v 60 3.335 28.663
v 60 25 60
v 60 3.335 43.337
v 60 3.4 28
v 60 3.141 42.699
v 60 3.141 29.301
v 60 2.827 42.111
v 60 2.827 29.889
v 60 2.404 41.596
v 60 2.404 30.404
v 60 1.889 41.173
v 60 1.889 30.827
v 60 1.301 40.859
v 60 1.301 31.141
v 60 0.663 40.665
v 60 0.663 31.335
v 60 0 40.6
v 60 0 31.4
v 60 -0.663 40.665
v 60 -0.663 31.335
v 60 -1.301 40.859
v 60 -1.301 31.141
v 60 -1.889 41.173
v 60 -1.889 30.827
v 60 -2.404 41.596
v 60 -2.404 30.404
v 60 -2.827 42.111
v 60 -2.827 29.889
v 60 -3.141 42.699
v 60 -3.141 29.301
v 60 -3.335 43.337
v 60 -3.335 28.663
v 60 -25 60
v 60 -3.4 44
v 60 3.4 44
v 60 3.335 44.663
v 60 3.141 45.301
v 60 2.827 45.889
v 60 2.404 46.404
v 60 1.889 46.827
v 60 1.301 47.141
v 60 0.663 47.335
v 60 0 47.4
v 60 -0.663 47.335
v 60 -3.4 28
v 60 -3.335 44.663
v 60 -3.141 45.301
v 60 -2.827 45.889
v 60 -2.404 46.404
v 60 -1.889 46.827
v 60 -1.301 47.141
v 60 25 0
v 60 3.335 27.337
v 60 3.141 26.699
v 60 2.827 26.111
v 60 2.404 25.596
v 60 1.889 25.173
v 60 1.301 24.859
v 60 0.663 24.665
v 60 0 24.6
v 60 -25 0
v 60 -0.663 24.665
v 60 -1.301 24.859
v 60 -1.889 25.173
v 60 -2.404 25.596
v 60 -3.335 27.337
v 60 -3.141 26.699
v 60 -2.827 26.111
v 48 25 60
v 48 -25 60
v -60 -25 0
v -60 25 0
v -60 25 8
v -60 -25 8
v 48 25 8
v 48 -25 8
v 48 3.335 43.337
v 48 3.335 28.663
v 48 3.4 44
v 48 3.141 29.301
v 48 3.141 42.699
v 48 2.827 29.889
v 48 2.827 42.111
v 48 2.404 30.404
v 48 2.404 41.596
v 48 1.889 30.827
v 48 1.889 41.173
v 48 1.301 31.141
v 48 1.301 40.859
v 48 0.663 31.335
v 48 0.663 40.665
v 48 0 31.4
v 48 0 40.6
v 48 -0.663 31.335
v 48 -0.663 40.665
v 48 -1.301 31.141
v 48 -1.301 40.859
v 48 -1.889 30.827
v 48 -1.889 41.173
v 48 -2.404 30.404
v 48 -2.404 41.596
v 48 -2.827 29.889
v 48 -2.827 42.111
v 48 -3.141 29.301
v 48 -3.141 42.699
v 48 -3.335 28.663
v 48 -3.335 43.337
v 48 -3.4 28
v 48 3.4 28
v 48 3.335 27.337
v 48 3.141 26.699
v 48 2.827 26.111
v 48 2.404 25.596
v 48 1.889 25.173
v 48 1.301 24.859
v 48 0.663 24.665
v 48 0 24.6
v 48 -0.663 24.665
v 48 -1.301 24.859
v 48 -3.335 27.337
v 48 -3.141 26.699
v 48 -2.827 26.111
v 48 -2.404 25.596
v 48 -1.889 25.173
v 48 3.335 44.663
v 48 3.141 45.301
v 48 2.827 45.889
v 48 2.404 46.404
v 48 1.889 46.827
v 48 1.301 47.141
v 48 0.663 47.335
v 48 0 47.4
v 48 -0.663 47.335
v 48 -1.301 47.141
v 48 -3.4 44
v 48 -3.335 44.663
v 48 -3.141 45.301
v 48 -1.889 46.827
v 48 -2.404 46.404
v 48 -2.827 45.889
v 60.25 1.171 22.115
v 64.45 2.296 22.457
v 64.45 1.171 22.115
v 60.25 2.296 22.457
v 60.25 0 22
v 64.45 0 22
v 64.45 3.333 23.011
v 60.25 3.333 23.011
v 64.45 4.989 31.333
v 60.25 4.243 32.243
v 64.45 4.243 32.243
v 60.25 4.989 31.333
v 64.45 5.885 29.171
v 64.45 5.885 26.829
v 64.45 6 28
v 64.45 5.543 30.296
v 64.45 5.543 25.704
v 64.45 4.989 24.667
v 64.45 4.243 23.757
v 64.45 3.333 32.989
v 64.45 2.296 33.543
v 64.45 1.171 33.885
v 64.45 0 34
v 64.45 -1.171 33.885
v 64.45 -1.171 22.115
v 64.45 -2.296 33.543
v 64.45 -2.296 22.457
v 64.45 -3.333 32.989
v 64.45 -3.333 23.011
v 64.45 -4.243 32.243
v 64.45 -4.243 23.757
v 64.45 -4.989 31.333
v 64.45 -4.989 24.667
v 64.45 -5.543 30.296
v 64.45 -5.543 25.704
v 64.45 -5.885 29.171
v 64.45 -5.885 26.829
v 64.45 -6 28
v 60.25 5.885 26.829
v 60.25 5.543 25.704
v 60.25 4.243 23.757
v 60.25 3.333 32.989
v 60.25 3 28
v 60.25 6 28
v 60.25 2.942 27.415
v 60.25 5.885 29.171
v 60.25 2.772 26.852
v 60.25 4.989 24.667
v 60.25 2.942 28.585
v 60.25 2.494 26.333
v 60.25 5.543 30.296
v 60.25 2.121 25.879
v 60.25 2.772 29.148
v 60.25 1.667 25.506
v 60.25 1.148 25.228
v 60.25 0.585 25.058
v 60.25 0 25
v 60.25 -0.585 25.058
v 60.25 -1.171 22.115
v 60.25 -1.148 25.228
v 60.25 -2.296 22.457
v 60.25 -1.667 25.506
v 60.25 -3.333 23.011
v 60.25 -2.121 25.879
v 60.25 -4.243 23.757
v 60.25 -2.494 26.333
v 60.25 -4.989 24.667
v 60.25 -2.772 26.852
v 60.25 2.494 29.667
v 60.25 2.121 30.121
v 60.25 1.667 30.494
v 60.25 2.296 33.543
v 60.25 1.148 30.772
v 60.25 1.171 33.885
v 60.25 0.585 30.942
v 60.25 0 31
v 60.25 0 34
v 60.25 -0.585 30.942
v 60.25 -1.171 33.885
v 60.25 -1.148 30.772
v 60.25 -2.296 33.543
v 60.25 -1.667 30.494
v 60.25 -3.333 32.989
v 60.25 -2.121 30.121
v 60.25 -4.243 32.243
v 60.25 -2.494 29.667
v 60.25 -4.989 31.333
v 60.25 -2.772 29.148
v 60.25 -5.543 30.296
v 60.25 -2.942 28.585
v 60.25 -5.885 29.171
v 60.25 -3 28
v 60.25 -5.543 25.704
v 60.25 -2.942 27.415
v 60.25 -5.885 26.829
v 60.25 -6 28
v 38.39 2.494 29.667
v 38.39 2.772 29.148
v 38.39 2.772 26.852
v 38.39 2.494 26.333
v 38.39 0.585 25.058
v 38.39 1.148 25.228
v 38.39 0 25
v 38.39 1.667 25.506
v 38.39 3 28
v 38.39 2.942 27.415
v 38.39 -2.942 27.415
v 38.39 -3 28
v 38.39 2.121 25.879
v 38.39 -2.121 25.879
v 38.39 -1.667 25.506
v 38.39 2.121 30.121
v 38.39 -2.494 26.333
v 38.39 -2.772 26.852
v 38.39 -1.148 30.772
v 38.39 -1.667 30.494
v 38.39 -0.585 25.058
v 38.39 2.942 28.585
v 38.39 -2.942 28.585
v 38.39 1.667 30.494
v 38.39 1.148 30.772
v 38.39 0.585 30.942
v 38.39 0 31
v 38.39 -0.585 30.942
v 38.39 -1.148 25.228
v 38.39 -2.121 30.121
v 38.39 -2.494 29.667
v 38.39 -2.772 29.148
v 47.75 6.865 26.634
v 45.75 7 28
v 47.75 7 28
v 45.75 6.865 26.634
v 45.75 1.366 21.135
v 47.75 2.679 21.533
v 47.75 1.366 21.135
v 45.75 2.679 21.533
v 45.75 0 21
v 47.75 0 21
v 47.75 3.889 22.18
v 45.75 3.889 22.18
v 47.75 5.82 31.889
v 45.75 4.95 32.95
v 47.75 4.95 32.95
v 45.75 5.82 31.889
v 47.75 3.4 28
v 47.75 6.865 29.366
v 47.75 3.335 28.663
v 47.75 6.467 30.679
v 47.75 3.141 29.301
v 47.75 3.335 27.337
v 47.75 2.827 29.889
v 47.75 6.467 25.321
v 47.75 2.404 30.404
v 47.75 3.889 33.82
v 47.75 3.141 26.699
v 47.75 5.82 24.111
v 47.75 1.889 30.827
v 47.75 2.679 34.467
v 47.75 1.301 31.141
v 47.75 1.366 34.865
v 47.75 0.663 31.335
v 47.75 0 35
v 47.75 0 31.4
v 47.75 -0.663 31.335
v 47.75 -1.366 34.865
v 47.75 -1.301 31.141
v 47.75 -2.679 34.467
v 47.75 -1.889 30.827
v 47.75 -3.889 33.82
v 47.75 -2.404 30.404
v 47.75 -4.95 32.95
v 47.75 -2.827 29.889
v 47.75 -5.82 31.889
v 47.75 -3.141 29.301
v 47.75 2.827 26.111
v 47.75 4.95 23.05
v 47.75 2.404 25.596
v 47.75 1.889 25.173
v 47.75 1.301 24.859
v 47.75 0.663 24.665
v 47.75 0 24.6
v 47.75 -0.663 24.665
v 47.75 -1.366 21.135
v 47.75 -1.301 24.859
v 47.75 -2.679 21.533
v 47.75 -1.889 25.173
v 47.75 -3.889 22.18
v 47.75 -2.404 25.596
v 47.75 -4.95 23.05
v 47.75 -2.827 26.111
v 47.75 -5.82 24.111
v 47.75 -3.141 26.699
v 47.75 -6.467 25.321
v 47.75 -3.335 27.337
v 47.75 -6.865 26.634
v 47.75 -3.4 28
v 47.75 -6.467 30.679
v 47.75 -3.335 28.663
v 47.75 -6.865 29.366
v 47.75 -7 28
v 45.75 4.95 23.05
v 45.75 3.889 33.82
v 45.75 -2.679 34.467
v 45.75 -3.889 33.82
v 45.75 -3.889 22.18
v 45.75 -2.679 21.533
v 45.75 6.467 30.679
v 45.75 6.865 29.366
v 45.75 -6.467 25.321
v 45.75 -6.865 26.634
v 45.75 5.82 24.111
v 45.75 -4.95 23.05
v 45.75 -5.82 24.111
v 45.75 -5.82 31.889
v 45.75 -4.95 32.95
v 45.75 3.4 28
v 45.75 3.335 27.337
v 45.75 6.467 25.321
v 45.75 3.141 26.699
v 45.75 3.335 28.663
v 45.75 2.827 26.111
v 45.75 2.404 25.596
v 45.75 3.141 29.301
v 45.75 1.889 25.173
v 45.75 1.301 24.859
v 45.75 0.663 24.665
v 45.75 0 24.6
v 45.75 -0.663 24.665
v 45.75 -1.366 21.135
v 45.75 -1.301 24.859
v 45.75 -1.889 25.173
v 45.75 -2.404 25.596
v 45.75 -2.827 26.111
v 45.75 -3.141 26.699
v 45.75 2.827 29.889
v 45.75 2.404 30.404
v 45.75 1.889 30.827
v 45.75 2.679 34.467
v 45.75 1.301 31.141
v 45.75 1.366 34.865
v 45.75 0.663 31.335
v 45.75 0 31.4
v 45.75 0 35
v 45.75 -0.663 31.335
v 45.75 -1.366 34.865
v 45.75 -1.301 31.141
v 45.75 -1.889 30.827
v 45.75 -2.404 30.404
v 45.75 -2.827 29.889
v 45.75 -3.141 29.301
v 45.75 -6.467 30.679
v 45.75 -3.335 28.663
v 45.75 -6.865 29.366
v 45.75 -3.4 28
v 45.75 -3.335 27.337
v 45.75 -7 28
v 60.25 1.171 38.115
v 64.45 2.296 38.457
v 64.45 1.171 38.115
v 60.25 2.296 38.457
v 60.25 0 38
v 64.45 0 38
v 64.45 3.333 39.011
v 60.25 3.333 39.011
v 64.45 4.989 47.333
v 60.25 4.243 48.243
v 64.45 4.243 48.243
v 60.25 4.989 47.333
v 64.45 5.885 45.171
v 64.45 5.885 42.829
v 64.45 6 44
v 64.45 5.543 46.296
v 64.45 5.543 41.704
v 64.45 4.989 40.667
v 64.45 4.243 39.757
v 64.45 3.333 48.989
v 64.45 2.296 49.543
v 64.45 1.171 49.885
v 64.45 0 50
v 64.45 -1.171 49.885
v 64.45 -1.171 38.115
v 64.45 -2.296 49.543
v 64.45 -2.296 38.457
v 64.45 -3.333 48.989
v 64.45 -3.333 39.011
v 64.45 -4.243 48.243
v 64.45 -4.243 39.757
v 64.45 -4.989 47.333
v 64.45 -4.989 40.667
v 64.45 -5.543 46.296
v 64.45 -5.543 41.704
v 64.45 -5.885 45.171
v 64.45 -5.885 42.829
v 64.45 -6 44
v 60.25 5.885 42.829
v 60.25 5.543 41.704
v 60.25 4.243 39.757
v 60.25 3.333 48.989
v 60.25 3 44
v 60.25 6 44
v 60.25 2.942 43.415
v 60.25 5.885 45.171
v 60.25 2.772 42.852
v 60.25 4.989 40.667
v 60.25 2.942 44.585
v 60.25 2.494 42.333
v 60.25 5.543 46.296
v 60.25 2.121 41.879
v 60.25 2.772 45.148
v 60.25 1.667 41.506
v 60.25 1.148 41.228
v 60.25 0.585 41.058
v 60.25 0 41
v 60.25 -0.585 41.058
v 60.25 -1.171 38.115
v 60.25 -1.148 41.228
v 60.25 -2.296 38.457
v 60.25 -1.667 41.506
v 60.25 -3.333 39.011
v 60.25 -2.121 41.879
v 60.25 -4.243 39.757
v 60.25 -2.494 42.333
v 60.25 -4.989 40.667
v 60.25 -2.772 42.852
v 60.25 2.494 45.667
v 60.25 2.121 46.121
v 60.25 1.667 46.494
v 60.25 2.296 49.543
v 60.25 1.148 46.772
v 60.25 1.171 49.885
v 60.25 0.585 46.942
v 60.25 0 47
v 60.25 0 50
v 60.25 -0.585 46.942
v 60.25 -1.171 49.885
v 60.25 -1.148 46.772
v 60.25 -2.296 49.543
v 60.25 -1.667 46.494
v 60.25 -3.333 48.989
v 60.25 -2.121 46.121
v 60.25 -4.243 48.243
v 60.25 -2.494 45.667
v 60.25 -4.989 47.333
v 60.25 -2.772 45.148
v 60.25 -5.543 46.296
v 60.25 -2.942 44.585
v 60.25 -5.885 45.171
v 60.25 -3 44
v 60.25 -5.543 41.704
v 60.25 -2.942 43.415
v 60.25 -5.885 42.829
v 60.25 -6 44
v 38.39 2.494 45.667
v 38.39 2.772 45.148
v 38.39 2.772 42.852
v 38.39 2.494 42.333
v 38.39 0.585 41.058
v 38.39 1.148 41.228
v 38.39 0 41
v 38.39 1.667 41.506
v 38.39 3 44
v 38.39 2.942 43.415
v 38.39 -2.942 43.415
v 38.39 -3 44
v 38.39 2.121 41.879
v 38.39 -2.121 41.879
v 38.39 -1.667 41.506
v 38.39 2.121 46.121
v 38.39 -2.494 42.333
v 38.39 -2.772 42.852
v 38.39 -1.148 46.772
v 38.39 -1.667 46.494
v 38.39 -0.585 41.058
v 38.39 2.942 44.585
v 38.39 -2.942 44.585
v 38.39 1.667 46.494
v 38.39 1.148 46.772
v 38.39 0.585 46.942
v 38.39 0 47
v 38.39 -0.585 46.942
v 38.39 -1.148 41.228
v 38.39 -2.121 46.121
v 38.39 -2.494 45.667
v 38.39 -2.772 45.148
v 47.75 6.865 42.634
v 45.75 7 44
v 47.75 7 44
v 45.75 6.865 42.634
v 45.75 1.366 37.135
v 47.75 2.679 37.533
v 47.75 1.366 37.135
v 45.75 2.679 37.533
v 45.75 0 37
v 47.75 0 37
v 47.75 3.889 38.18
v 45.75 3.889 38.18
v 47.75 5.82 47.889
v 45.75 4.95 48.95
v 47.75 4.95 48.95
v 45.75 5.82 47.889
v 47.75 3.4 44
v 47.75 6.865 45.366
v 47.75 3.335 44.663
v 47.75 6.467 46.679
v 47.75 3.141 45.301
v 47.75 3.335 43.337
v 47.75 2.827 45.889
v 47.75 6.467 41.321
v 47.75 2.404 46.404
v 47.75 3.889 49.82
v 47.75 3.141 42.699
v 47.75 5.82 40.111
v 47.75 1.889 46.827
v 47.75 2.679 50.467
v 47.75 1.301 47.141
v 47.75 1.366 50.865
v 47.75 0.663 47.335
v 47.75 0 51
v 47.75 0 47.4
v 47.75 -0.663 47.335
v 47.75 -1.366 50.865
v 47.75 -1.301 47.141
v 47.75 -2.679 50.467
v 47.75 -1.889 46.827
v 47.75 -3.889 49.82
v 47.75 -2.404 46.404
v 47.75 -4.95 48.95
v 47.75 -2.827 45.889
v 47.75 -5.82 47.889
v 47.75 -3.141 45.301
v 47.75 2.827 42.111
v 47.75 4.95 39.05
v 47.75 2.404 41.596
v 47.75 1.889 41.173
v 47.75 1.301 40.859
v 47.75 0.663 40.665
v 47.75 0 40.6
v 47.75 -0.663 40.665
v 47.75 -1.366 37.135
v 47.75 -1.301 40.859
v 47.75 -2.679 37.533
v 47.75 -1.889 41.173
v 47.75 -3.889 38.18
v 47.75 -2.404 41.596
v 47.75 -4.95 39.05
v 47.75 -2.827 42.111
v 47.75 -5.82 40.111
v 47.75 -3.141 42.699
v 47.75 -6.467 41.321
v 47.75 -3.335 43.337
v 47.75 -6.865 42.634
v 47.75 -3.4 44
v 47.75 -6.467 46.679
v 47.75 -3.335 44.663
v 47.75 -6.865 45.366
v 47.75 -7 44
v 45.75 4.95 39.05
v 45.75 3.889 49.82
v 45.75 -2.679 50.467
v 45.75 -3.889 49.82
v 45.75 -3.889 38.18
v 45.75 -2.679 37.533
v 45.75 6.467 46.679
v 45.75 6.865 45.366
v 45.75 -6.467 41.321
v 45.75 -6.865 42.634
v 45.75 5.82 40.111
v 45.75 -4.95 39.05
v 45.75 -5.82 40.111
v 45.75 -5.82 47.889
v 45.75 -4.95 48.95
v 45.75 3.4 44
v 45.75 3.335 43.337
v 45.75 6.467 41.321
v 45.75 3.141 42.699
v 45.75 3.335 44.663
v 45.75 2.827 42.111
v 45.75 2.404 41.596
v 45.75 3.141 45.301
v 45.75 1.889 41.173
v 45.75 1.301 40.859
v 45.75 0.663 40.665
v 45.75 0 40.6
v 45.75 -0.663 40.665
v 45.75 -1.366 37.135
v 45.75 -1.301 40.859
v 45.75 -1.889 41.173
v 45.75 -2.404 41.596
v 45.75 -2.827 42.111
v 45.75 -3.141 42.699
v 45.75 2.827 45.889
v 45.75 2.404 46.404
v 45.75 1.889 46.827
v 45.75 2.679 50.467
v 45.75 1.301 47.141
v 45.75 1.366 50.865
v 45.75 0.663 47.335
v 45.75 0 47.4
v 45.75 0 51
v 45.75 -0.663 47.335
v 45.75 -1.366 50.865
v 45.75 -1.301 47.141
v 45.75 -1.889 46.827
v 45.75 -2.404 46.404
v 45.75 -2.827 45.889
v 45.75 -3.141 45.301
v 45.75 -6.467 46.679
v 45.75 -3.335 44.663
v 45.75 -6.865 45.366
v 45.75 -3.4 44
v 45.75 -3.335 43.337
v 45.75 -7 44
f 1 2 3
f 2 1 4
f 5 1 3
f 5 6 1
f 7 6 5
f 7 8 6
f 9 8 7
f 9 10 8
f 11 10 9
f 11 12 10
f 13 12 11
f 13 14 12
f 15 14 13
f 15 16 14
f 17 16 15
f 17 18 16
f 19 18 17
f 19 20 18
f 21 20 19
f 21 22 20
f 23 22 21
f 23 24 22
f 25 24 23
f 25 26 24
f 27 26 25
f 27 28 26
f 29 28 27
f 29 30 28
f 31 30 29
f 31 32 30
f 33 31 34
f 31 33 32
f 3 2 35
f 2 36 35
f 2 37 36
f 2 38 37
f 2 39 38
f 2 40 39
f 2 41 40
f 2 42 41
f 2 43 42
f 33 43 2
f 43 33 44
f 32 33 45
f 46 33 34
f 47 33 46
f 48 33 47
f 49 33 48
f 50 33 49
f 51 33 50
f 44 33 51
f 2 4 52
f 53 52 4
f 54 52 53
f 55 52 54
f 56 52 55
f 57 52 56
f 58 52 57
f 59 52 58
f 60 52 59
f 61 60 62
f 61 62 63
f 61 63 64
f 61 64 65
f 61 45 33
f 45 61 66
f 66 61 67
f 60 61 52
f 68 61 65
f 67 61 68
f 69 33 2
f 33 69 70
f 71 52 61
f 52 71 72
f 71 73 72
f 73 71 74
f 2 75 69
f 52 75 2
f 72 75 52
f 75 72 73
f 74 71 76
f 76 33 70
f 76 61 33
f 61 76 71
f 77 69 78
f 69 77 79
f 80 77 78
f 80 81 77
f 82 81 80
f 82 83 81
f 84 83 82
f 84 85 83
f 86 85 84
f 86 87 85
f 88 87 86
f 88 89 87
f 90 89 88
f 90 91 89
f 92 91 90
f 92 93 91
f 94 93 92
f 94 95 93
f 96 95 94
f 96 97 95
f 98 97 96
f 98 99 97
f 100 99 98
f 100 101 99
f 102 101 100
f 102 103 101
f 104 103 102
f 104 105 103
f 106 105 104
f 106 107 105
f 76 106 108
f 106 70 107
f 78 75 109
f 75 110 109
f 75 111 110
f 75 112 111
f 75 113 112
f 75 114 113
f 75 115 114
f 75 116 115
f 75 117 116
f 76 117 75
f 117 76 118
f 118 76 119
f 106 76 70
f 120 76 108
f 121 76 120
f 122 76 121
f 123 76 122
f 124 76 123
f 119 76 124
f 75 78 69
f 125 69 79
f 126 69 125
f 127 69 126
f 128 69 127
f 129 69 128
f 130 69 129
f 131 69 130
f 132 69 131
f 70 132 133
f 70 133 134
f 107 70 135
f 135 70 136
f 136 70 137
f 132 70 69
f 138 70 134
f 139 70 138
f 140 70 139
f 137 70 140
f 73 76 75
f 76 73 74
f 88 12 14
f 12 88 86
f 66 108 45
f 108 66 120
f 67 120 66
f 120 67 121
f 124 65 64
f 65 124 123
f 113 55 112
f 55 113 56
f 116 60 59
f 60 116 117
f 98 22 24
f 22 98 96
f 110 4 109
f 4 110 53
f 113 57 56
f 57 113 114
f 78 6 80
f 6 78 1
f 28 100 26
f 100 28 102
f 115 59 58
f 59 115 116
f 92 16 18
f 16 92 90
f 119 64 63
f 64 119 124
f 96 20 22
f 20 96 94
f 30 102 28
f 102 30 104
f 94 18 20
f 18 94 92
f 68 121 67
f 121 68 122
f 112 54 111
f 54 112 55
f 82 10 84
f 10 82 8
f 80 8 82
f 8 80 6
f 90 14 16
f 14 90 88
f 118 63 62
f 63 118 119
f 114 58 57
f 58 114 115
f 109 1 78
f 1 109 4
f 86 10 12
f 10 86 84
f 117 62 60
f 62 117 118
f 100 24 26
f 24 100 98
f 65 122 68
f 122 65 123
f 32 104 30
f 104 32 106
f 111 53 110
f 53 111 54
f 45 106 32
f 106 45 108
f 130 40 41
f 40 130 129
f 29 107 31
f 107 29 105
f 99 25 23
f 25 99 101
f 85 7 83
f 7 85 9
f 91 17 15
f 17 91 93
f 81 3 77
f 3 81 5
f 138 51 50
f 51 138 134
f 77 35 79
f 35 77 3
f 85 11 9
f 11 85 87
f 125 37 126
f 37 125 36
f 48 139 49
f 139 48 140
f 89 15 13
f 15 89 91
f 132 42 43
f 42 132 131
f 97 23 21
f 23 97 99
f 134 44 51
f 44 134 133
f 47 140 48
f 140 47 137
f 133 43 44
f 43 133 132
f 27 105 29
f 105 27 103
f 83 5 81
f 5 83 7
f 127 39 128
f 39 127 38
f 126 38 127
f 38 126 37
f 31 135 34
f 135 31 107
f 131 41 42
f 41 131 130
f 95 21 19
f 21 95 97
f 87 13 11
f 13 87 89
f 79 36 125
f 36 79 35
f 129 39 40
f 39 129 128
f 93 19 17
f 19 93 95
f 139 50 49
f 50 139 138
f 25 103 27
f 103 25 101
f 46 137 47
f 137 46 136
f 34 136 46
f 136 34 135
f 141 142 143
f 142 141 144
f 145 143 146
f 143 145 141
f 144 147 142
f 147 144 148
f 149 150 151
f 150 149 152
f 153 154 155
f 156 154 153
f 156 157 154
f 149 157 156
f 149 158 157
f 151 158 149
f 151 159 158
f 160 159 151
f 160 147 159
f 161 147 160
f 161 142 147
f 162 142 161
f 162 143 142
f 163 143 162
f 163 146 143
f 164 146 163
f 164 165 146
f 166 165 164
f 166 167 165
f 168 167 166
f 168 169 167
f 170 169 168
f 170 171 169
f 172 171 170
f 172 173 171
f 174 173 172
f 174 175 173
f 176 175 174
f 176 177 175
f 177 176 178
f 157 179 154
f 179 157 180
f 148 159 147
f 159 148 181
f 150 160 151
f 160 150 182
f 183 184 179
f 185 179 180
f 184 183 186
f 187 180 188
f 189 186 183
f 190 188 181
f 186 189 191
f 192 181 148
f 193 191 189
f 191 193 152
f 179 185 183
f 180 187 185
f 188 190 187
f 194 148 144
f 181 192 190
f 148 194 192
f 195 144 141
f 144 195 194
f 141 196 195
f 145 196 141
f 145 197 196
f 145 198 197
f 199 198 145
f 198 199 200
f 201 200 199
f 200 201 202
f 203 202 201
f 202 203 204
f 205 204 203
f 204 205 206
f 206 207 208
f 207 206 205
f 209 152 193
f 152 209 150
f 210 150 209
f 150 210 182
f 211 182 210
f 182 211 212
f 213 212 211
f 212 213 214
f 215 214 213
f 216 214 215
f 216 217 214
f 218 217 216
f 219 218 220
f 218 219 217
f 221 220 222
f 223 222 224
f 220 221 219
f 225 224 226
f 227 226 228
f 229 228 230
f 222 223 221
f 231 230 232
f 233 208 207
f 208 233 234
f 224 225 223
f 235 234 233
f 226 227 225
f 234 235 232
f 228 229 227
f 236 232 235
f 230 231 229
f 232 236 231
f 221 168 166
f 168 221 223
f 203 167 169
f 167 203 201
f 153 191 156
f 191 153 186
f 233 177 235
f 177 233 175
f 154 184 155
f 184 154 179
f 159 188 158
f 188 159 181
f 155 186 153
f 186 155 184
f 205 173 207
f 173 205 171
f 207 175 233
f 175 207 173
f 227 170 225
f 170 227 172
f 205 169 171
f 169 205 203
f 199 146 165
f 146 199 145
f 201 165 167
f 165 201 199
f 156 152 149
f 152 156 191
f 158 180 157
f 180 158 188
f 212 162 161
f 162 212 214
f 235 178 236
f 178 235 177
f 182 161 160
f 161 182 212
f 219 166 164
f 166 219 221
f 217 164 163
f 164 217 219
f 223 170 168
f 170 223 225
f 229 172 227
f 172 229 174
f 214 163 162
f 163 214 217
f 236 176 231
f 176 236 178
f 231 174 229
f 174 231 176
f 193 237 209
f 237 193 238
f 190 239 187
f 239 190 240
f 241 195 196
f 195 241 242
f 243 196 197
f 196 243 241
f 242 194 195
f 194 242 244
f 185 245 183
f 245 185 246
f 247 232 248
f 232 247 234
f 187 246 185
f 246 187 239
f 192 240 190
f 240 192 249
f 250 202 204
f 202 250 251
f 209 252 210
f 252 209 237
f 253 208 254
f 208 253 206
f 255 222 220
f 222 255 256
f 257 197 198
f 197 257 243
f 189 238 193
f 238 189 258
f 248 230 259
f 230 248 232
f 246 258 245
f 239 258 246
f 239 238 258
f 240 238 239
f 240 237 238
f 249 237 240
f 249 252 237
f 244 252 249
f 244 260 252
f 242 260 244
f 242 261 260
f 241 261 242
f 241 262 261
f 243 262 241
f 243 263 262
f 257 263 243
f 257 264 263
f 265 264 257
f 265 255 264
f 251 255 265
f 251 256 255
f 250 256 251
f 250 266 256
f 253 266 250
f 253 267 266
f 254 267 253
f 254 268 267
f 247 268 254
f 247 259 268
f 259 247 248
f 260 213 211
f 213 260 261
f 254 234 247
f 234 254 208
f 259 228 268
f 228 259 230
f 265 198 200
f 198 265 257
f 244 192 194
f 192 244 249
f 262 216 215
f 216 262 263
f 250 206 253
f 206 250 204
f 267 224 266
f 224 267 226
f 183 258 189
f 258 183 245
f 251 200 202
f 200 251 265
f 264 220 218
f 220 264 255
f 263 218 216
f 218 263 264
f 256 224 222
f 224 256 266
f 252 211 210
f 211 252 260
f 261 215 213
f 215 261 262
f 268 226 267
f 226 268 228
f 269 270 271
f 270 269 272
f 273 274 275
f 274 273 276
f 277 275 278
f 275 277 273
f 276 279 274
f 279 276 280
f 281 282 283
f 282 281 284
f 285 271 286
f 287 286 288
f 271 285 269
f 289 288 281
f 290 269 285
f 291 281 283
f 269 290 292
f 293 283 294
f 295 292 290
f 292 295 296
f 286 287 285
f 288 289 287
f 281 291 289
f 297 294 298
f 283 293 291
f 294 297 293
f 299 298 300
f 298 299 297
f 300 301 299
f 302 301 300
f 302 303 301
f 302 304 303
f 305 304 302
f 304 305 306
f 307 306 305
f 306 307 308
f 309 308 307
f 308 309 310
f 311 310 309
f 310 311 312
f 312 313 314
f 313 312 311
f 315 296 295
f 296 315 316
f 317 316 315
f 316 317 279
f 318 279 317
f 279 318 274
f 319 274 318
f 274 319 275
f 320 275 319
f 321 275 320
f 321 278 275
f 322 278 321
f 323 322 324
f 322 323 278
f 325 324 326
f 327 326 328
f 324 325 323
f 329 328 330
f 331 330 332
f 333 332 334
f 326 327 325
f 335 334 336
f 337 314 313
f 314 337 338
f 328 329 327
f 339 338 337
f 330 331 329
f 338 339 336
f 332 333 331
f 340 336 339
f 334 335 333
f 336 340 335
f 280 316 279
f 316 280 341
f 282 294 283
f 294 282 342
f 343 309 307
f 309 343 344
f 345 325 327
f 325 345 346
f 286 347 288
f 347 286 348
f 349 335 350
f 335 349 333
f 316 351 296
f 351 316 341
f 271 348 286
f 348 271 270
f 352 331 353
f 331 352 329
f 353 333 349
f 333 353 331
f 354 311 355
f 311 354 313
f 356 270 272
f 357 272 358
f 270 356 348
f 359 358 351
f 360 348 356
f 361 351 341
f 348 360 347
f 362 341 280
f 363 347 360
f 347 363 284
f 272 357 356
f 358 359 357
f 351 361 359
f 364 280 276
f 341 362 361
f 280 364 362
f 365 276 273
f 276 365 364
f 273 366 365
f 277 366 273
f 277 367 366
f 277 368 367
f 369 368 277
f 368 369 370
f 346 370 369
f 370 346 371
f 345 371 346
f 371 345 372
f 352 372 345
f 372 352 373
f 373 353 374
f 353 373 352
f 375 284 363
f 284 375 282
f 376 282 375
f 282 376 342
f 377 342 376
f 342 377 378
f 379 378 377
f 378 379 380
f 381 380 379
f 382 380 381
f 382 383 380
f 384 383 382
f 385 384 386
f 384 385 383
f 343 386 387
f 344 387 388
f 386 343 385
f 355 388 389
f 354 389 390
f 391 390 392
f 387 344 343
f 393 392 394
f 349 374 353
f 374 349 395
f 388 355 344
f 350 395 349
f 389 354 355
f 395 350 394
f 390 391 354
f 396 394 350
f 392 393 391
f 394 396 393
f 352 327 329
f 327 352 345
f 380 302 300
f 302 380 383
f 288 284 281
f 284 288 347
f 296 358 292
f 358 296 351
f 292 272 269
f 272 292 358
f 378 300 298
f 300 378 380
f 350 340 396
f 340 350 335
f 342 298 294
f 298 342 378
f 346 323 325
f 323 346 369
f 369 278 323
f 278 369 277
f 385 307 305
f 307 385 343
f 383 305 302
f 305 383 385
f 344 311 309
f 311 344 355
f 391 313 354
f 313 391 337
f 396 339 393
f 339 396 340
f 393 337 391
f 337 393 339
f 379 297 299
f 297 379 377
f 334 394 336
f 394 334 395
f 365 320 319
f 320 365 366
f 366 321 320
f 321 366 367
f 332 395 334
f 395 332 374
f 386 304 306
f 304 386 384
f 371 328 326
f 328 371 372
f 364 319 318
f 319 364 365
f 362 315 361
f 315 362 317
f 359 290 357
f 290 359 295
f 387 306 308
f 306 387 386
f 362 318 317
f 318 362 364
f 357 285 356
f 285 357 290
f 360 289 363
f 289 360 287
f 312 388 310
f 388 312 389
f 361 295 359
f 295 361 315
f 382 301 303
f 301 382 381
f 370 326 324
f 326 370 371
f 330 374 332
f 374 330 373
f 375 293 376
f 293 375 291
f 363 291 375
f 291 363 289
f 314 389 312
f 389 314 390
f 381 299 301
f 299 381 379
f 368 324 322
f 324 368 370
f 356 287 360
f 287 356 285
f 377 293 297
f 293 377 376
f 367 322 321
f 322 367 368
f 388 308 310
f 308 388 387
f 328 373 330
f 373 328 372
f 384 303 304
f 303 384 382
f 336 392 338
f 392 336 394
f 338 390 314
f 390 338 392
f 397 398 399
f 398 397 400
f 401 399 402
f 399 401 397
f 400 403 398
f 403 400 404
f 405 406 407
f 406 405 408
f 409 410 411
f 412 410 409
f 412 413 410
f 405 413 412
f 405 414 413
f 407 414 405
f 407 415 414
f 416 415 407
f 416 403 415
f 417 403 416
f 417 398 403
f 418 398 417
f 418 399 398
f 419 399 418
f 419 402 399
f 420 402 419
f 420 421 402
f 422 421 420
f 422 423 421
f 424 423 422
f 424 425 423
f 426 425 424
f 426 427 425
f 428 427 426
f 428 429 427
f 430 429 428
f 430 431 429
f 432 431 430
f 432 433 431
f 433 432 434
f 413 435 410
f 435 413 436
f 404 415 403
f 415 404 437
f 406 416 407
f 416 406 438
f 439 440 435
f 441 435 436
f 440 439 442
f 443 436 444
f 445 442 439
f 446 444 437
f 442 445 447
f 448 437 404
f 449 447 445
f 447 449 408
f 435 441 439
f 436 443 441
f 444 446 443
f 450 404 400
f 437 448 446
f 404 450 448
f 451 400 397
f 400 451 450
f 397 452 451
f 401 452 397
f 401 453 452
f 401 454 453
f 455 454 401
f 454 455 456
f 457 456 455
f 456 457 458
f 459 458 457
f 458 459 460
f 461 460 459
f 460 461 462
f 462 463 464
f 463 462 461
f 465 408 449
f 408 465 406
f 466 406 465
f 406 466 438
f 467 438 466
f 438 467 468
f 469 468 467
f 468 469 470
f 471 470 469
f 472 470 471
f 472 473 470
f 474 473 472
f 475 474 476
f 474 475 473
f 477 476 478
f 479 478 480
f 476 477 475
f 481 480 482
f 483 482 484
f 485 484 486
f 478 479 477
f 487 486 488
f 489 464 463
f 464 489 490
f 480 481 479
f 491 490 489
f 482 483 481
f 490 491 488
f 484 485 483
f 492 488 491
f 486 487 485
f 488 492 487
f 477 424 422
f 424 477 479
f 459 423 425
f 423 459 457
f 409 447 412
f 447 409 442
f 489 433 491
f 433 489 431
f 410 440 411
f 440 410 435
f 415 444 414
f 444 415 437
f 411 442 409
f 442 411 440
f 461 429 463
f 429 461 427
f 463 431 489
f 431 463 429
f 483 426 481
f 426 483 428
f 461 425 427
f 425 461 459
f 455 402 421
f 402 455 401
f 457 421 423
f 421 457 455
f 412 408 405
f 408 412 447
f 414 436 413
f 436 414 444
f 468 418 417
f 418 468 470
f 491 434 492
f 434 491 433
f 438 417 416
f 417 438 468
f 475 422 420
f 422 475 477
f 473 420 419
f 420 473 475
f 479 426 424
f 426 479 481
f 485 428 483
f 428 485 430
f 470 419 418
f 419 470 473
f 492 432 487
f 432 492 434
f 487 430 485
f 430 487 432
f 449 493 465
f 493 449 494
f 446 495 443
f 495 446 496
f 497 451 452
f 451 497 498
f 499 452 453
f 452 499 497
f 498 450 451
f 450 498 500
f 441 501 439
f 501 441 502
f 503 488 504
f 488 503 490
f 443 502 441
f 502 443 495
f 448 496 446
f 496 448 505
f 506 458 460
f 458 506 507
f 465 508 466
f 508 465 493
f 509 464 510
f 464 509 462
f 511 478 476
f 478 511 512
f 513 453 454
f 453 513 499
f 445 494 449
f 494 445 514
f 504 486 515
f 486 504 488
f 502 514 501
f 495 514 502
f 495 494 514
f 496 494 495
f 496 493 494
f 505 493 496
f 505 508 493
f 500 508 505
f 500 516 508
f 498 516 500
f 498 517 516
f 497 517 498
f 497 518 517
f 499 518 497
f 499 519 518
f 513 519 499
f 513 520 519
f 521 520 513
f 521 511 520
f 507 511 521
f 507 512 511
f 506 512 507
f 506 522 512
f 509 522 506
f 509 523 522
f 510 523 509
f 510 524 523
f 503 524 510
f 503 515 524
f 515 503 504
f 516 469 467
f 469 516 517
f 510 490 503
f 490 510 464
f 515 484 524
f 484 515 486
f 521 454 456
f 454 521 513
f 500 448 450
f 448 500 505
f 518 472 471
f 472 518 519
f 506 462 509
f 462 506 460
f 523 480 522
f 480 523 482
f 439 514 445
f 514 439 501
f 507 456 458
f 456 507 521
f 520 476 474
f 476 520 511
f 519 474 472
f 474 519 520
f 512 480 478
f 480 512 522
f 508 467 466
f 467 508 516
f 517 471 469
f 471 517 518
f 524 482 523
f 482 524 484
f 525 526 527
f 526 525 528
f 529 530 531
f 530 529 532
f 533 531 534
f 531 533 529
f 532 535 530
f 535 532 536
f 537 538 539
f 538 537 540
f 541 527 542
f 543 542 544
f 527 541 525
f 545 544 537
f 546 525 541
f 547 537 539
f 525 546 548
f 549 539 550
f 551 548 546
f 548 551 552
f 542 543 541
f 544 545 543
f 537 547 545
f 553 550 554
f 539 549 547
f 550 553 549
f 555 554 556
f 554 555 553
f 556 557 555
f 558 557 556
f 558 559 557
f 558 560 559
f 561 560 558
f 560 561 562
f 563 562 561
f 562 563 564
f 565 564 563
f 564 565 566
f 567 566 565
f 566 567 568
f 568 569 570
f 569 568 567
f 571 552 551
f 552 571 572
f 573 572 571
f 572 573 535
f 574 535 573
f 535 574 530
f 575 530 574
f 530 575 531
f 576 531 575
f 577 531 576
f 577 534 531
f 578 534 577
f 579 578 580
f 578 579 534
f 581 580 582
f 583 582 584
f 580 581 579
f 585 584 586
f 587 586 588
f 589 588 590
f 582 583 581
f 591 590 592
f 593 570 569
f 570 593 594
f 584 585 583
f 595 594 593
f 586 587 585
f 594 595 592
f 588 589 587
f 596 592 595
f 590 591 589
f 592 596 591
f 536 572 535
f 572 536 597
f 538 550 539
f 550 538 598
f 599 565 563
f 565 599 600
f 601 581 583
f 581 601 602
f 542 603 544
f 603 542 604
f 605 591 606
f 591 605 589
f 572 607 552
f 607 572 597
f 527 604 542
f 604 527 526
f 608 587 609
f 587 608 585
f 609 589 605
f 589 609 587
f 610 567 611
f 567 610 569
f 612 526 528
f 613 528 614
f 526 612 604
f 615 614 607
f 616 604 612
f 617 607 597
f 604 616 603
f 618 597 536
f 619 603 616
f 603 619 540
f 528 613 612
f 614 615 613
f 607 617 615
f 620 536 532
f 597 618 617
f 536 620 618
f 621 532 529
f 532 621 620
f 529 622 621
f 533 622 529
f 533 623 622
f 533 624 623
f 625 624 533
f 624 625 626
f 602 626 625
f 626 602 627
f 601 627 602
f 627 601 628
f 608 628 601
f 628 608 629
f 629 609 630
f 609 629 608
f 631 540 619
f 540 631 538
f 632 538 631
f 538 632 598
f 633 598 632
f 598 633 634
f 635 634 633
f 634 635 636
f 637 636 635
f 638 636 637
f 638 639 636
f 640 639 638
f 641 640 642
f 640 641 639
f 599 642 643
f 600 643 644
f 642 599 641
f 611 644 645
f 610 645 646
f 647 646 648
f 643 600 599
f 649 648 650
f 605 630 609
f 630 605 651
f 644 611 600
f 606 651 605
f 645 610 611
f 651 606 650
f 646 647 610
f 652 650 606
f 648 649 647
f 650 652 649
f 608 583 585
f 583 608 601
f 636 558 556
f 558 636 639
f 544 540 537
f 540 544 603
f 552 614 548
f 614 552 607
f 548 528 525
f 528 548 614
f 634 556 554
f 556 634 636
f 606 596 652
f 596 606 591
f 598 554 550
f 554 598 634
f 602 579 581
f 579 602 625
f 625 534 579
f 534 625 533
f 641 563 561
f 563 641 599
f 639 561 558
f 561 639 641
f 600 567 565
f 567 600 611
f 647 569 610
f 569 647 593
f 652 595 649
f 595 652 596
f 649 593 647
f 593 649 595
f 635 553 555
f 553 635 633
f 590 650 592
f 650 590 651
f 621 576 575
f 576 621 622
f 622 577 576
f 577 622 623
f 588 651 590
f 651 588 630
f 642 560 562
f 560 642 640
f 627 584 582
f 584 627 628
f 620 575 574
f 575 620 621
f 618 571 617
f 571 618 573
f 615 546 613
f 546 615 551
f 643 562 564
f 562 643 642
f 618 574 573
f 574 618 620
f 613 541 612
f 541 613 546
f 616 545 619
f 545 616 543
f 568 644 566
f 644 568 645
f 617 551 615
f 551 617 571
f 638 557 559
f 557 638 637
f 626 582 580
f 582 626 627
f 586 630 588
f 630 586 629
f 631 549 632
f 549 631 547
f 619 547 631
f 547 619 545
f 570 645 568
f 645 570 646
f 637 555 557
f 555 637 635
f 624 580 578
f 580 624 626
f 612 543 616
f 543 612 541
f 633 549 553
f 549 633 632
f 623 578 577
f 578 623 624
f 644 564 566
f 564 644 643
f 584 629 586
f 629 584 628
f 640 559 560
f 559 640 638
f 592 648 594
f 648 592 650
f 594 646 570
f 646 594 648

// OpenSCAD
$fn = 32;

// ------------------------------------------------------------------------
// Bolted bracket: 120 x 50 mm bracket with 2 bolt joints
// Every part is its own module, assembly() places them once.
// ------------------------------------------------------------------------

// --- part 1 ---
module bracket() {
  difference() {
    translate([-60, -25, 0]) cube([120, 50, 60]);
    translate([-61, -26, 8]) cube([109, 52, 53]);
    translate([54, 0, 28]) rotate([0, 90, 0]) cylinder(h = 14, d = 6.8, center = true);
    translate([54, 0, 44]) rotate([0, 90, 0]) cylinder(h = 14, d = 6.8, center = true);
  }
}

// --- part 2 ---
module bolt1() {
  cylinder(h = 4.2, d = 12);
  translate([0, 0, -21.86]) cylinder(h = 21.86, d = 6);
}

// --- part 3 ---
module washer1() {
  difference() {
      translate([0, 0, 0]) cylinder(h = 2, d = 14);
      translate([0, 0, -1]) cylinder(h = 4, d = 6.8);
    }
}

// --- part 4 ---
module bolt2() {
  cylinder(h = 4.2, d = 12);
  translate([0, 0, -21.86]) cylinder(h = 21.86, d = 6);
}

// --- part 5 ---
module washer2() {
  difference() {
      translate([0, 0, 0]) cylinder(h = 2, d = 14);
      translate([0, 0, -1]) cylinder(h = 4, d = 6.8);
    }
}

// --- assembly ---
module assembly() {
  translate([0, 0, 0]) rotate([0, 0, 0]) bracket();
  translate([60.25, 0, 28]) rotate([0, 90, 0]) bolt1();
  translate([45.75, 0, 28]) rotate([0, 90, 0]) washer1();
  translate([60.25, 0, 44]) rotate([0, 90, 0]) bolt2();
  translate([45.75, 0, 44]) rotate([0, 90, 0]) washer2();
}

assembly();
